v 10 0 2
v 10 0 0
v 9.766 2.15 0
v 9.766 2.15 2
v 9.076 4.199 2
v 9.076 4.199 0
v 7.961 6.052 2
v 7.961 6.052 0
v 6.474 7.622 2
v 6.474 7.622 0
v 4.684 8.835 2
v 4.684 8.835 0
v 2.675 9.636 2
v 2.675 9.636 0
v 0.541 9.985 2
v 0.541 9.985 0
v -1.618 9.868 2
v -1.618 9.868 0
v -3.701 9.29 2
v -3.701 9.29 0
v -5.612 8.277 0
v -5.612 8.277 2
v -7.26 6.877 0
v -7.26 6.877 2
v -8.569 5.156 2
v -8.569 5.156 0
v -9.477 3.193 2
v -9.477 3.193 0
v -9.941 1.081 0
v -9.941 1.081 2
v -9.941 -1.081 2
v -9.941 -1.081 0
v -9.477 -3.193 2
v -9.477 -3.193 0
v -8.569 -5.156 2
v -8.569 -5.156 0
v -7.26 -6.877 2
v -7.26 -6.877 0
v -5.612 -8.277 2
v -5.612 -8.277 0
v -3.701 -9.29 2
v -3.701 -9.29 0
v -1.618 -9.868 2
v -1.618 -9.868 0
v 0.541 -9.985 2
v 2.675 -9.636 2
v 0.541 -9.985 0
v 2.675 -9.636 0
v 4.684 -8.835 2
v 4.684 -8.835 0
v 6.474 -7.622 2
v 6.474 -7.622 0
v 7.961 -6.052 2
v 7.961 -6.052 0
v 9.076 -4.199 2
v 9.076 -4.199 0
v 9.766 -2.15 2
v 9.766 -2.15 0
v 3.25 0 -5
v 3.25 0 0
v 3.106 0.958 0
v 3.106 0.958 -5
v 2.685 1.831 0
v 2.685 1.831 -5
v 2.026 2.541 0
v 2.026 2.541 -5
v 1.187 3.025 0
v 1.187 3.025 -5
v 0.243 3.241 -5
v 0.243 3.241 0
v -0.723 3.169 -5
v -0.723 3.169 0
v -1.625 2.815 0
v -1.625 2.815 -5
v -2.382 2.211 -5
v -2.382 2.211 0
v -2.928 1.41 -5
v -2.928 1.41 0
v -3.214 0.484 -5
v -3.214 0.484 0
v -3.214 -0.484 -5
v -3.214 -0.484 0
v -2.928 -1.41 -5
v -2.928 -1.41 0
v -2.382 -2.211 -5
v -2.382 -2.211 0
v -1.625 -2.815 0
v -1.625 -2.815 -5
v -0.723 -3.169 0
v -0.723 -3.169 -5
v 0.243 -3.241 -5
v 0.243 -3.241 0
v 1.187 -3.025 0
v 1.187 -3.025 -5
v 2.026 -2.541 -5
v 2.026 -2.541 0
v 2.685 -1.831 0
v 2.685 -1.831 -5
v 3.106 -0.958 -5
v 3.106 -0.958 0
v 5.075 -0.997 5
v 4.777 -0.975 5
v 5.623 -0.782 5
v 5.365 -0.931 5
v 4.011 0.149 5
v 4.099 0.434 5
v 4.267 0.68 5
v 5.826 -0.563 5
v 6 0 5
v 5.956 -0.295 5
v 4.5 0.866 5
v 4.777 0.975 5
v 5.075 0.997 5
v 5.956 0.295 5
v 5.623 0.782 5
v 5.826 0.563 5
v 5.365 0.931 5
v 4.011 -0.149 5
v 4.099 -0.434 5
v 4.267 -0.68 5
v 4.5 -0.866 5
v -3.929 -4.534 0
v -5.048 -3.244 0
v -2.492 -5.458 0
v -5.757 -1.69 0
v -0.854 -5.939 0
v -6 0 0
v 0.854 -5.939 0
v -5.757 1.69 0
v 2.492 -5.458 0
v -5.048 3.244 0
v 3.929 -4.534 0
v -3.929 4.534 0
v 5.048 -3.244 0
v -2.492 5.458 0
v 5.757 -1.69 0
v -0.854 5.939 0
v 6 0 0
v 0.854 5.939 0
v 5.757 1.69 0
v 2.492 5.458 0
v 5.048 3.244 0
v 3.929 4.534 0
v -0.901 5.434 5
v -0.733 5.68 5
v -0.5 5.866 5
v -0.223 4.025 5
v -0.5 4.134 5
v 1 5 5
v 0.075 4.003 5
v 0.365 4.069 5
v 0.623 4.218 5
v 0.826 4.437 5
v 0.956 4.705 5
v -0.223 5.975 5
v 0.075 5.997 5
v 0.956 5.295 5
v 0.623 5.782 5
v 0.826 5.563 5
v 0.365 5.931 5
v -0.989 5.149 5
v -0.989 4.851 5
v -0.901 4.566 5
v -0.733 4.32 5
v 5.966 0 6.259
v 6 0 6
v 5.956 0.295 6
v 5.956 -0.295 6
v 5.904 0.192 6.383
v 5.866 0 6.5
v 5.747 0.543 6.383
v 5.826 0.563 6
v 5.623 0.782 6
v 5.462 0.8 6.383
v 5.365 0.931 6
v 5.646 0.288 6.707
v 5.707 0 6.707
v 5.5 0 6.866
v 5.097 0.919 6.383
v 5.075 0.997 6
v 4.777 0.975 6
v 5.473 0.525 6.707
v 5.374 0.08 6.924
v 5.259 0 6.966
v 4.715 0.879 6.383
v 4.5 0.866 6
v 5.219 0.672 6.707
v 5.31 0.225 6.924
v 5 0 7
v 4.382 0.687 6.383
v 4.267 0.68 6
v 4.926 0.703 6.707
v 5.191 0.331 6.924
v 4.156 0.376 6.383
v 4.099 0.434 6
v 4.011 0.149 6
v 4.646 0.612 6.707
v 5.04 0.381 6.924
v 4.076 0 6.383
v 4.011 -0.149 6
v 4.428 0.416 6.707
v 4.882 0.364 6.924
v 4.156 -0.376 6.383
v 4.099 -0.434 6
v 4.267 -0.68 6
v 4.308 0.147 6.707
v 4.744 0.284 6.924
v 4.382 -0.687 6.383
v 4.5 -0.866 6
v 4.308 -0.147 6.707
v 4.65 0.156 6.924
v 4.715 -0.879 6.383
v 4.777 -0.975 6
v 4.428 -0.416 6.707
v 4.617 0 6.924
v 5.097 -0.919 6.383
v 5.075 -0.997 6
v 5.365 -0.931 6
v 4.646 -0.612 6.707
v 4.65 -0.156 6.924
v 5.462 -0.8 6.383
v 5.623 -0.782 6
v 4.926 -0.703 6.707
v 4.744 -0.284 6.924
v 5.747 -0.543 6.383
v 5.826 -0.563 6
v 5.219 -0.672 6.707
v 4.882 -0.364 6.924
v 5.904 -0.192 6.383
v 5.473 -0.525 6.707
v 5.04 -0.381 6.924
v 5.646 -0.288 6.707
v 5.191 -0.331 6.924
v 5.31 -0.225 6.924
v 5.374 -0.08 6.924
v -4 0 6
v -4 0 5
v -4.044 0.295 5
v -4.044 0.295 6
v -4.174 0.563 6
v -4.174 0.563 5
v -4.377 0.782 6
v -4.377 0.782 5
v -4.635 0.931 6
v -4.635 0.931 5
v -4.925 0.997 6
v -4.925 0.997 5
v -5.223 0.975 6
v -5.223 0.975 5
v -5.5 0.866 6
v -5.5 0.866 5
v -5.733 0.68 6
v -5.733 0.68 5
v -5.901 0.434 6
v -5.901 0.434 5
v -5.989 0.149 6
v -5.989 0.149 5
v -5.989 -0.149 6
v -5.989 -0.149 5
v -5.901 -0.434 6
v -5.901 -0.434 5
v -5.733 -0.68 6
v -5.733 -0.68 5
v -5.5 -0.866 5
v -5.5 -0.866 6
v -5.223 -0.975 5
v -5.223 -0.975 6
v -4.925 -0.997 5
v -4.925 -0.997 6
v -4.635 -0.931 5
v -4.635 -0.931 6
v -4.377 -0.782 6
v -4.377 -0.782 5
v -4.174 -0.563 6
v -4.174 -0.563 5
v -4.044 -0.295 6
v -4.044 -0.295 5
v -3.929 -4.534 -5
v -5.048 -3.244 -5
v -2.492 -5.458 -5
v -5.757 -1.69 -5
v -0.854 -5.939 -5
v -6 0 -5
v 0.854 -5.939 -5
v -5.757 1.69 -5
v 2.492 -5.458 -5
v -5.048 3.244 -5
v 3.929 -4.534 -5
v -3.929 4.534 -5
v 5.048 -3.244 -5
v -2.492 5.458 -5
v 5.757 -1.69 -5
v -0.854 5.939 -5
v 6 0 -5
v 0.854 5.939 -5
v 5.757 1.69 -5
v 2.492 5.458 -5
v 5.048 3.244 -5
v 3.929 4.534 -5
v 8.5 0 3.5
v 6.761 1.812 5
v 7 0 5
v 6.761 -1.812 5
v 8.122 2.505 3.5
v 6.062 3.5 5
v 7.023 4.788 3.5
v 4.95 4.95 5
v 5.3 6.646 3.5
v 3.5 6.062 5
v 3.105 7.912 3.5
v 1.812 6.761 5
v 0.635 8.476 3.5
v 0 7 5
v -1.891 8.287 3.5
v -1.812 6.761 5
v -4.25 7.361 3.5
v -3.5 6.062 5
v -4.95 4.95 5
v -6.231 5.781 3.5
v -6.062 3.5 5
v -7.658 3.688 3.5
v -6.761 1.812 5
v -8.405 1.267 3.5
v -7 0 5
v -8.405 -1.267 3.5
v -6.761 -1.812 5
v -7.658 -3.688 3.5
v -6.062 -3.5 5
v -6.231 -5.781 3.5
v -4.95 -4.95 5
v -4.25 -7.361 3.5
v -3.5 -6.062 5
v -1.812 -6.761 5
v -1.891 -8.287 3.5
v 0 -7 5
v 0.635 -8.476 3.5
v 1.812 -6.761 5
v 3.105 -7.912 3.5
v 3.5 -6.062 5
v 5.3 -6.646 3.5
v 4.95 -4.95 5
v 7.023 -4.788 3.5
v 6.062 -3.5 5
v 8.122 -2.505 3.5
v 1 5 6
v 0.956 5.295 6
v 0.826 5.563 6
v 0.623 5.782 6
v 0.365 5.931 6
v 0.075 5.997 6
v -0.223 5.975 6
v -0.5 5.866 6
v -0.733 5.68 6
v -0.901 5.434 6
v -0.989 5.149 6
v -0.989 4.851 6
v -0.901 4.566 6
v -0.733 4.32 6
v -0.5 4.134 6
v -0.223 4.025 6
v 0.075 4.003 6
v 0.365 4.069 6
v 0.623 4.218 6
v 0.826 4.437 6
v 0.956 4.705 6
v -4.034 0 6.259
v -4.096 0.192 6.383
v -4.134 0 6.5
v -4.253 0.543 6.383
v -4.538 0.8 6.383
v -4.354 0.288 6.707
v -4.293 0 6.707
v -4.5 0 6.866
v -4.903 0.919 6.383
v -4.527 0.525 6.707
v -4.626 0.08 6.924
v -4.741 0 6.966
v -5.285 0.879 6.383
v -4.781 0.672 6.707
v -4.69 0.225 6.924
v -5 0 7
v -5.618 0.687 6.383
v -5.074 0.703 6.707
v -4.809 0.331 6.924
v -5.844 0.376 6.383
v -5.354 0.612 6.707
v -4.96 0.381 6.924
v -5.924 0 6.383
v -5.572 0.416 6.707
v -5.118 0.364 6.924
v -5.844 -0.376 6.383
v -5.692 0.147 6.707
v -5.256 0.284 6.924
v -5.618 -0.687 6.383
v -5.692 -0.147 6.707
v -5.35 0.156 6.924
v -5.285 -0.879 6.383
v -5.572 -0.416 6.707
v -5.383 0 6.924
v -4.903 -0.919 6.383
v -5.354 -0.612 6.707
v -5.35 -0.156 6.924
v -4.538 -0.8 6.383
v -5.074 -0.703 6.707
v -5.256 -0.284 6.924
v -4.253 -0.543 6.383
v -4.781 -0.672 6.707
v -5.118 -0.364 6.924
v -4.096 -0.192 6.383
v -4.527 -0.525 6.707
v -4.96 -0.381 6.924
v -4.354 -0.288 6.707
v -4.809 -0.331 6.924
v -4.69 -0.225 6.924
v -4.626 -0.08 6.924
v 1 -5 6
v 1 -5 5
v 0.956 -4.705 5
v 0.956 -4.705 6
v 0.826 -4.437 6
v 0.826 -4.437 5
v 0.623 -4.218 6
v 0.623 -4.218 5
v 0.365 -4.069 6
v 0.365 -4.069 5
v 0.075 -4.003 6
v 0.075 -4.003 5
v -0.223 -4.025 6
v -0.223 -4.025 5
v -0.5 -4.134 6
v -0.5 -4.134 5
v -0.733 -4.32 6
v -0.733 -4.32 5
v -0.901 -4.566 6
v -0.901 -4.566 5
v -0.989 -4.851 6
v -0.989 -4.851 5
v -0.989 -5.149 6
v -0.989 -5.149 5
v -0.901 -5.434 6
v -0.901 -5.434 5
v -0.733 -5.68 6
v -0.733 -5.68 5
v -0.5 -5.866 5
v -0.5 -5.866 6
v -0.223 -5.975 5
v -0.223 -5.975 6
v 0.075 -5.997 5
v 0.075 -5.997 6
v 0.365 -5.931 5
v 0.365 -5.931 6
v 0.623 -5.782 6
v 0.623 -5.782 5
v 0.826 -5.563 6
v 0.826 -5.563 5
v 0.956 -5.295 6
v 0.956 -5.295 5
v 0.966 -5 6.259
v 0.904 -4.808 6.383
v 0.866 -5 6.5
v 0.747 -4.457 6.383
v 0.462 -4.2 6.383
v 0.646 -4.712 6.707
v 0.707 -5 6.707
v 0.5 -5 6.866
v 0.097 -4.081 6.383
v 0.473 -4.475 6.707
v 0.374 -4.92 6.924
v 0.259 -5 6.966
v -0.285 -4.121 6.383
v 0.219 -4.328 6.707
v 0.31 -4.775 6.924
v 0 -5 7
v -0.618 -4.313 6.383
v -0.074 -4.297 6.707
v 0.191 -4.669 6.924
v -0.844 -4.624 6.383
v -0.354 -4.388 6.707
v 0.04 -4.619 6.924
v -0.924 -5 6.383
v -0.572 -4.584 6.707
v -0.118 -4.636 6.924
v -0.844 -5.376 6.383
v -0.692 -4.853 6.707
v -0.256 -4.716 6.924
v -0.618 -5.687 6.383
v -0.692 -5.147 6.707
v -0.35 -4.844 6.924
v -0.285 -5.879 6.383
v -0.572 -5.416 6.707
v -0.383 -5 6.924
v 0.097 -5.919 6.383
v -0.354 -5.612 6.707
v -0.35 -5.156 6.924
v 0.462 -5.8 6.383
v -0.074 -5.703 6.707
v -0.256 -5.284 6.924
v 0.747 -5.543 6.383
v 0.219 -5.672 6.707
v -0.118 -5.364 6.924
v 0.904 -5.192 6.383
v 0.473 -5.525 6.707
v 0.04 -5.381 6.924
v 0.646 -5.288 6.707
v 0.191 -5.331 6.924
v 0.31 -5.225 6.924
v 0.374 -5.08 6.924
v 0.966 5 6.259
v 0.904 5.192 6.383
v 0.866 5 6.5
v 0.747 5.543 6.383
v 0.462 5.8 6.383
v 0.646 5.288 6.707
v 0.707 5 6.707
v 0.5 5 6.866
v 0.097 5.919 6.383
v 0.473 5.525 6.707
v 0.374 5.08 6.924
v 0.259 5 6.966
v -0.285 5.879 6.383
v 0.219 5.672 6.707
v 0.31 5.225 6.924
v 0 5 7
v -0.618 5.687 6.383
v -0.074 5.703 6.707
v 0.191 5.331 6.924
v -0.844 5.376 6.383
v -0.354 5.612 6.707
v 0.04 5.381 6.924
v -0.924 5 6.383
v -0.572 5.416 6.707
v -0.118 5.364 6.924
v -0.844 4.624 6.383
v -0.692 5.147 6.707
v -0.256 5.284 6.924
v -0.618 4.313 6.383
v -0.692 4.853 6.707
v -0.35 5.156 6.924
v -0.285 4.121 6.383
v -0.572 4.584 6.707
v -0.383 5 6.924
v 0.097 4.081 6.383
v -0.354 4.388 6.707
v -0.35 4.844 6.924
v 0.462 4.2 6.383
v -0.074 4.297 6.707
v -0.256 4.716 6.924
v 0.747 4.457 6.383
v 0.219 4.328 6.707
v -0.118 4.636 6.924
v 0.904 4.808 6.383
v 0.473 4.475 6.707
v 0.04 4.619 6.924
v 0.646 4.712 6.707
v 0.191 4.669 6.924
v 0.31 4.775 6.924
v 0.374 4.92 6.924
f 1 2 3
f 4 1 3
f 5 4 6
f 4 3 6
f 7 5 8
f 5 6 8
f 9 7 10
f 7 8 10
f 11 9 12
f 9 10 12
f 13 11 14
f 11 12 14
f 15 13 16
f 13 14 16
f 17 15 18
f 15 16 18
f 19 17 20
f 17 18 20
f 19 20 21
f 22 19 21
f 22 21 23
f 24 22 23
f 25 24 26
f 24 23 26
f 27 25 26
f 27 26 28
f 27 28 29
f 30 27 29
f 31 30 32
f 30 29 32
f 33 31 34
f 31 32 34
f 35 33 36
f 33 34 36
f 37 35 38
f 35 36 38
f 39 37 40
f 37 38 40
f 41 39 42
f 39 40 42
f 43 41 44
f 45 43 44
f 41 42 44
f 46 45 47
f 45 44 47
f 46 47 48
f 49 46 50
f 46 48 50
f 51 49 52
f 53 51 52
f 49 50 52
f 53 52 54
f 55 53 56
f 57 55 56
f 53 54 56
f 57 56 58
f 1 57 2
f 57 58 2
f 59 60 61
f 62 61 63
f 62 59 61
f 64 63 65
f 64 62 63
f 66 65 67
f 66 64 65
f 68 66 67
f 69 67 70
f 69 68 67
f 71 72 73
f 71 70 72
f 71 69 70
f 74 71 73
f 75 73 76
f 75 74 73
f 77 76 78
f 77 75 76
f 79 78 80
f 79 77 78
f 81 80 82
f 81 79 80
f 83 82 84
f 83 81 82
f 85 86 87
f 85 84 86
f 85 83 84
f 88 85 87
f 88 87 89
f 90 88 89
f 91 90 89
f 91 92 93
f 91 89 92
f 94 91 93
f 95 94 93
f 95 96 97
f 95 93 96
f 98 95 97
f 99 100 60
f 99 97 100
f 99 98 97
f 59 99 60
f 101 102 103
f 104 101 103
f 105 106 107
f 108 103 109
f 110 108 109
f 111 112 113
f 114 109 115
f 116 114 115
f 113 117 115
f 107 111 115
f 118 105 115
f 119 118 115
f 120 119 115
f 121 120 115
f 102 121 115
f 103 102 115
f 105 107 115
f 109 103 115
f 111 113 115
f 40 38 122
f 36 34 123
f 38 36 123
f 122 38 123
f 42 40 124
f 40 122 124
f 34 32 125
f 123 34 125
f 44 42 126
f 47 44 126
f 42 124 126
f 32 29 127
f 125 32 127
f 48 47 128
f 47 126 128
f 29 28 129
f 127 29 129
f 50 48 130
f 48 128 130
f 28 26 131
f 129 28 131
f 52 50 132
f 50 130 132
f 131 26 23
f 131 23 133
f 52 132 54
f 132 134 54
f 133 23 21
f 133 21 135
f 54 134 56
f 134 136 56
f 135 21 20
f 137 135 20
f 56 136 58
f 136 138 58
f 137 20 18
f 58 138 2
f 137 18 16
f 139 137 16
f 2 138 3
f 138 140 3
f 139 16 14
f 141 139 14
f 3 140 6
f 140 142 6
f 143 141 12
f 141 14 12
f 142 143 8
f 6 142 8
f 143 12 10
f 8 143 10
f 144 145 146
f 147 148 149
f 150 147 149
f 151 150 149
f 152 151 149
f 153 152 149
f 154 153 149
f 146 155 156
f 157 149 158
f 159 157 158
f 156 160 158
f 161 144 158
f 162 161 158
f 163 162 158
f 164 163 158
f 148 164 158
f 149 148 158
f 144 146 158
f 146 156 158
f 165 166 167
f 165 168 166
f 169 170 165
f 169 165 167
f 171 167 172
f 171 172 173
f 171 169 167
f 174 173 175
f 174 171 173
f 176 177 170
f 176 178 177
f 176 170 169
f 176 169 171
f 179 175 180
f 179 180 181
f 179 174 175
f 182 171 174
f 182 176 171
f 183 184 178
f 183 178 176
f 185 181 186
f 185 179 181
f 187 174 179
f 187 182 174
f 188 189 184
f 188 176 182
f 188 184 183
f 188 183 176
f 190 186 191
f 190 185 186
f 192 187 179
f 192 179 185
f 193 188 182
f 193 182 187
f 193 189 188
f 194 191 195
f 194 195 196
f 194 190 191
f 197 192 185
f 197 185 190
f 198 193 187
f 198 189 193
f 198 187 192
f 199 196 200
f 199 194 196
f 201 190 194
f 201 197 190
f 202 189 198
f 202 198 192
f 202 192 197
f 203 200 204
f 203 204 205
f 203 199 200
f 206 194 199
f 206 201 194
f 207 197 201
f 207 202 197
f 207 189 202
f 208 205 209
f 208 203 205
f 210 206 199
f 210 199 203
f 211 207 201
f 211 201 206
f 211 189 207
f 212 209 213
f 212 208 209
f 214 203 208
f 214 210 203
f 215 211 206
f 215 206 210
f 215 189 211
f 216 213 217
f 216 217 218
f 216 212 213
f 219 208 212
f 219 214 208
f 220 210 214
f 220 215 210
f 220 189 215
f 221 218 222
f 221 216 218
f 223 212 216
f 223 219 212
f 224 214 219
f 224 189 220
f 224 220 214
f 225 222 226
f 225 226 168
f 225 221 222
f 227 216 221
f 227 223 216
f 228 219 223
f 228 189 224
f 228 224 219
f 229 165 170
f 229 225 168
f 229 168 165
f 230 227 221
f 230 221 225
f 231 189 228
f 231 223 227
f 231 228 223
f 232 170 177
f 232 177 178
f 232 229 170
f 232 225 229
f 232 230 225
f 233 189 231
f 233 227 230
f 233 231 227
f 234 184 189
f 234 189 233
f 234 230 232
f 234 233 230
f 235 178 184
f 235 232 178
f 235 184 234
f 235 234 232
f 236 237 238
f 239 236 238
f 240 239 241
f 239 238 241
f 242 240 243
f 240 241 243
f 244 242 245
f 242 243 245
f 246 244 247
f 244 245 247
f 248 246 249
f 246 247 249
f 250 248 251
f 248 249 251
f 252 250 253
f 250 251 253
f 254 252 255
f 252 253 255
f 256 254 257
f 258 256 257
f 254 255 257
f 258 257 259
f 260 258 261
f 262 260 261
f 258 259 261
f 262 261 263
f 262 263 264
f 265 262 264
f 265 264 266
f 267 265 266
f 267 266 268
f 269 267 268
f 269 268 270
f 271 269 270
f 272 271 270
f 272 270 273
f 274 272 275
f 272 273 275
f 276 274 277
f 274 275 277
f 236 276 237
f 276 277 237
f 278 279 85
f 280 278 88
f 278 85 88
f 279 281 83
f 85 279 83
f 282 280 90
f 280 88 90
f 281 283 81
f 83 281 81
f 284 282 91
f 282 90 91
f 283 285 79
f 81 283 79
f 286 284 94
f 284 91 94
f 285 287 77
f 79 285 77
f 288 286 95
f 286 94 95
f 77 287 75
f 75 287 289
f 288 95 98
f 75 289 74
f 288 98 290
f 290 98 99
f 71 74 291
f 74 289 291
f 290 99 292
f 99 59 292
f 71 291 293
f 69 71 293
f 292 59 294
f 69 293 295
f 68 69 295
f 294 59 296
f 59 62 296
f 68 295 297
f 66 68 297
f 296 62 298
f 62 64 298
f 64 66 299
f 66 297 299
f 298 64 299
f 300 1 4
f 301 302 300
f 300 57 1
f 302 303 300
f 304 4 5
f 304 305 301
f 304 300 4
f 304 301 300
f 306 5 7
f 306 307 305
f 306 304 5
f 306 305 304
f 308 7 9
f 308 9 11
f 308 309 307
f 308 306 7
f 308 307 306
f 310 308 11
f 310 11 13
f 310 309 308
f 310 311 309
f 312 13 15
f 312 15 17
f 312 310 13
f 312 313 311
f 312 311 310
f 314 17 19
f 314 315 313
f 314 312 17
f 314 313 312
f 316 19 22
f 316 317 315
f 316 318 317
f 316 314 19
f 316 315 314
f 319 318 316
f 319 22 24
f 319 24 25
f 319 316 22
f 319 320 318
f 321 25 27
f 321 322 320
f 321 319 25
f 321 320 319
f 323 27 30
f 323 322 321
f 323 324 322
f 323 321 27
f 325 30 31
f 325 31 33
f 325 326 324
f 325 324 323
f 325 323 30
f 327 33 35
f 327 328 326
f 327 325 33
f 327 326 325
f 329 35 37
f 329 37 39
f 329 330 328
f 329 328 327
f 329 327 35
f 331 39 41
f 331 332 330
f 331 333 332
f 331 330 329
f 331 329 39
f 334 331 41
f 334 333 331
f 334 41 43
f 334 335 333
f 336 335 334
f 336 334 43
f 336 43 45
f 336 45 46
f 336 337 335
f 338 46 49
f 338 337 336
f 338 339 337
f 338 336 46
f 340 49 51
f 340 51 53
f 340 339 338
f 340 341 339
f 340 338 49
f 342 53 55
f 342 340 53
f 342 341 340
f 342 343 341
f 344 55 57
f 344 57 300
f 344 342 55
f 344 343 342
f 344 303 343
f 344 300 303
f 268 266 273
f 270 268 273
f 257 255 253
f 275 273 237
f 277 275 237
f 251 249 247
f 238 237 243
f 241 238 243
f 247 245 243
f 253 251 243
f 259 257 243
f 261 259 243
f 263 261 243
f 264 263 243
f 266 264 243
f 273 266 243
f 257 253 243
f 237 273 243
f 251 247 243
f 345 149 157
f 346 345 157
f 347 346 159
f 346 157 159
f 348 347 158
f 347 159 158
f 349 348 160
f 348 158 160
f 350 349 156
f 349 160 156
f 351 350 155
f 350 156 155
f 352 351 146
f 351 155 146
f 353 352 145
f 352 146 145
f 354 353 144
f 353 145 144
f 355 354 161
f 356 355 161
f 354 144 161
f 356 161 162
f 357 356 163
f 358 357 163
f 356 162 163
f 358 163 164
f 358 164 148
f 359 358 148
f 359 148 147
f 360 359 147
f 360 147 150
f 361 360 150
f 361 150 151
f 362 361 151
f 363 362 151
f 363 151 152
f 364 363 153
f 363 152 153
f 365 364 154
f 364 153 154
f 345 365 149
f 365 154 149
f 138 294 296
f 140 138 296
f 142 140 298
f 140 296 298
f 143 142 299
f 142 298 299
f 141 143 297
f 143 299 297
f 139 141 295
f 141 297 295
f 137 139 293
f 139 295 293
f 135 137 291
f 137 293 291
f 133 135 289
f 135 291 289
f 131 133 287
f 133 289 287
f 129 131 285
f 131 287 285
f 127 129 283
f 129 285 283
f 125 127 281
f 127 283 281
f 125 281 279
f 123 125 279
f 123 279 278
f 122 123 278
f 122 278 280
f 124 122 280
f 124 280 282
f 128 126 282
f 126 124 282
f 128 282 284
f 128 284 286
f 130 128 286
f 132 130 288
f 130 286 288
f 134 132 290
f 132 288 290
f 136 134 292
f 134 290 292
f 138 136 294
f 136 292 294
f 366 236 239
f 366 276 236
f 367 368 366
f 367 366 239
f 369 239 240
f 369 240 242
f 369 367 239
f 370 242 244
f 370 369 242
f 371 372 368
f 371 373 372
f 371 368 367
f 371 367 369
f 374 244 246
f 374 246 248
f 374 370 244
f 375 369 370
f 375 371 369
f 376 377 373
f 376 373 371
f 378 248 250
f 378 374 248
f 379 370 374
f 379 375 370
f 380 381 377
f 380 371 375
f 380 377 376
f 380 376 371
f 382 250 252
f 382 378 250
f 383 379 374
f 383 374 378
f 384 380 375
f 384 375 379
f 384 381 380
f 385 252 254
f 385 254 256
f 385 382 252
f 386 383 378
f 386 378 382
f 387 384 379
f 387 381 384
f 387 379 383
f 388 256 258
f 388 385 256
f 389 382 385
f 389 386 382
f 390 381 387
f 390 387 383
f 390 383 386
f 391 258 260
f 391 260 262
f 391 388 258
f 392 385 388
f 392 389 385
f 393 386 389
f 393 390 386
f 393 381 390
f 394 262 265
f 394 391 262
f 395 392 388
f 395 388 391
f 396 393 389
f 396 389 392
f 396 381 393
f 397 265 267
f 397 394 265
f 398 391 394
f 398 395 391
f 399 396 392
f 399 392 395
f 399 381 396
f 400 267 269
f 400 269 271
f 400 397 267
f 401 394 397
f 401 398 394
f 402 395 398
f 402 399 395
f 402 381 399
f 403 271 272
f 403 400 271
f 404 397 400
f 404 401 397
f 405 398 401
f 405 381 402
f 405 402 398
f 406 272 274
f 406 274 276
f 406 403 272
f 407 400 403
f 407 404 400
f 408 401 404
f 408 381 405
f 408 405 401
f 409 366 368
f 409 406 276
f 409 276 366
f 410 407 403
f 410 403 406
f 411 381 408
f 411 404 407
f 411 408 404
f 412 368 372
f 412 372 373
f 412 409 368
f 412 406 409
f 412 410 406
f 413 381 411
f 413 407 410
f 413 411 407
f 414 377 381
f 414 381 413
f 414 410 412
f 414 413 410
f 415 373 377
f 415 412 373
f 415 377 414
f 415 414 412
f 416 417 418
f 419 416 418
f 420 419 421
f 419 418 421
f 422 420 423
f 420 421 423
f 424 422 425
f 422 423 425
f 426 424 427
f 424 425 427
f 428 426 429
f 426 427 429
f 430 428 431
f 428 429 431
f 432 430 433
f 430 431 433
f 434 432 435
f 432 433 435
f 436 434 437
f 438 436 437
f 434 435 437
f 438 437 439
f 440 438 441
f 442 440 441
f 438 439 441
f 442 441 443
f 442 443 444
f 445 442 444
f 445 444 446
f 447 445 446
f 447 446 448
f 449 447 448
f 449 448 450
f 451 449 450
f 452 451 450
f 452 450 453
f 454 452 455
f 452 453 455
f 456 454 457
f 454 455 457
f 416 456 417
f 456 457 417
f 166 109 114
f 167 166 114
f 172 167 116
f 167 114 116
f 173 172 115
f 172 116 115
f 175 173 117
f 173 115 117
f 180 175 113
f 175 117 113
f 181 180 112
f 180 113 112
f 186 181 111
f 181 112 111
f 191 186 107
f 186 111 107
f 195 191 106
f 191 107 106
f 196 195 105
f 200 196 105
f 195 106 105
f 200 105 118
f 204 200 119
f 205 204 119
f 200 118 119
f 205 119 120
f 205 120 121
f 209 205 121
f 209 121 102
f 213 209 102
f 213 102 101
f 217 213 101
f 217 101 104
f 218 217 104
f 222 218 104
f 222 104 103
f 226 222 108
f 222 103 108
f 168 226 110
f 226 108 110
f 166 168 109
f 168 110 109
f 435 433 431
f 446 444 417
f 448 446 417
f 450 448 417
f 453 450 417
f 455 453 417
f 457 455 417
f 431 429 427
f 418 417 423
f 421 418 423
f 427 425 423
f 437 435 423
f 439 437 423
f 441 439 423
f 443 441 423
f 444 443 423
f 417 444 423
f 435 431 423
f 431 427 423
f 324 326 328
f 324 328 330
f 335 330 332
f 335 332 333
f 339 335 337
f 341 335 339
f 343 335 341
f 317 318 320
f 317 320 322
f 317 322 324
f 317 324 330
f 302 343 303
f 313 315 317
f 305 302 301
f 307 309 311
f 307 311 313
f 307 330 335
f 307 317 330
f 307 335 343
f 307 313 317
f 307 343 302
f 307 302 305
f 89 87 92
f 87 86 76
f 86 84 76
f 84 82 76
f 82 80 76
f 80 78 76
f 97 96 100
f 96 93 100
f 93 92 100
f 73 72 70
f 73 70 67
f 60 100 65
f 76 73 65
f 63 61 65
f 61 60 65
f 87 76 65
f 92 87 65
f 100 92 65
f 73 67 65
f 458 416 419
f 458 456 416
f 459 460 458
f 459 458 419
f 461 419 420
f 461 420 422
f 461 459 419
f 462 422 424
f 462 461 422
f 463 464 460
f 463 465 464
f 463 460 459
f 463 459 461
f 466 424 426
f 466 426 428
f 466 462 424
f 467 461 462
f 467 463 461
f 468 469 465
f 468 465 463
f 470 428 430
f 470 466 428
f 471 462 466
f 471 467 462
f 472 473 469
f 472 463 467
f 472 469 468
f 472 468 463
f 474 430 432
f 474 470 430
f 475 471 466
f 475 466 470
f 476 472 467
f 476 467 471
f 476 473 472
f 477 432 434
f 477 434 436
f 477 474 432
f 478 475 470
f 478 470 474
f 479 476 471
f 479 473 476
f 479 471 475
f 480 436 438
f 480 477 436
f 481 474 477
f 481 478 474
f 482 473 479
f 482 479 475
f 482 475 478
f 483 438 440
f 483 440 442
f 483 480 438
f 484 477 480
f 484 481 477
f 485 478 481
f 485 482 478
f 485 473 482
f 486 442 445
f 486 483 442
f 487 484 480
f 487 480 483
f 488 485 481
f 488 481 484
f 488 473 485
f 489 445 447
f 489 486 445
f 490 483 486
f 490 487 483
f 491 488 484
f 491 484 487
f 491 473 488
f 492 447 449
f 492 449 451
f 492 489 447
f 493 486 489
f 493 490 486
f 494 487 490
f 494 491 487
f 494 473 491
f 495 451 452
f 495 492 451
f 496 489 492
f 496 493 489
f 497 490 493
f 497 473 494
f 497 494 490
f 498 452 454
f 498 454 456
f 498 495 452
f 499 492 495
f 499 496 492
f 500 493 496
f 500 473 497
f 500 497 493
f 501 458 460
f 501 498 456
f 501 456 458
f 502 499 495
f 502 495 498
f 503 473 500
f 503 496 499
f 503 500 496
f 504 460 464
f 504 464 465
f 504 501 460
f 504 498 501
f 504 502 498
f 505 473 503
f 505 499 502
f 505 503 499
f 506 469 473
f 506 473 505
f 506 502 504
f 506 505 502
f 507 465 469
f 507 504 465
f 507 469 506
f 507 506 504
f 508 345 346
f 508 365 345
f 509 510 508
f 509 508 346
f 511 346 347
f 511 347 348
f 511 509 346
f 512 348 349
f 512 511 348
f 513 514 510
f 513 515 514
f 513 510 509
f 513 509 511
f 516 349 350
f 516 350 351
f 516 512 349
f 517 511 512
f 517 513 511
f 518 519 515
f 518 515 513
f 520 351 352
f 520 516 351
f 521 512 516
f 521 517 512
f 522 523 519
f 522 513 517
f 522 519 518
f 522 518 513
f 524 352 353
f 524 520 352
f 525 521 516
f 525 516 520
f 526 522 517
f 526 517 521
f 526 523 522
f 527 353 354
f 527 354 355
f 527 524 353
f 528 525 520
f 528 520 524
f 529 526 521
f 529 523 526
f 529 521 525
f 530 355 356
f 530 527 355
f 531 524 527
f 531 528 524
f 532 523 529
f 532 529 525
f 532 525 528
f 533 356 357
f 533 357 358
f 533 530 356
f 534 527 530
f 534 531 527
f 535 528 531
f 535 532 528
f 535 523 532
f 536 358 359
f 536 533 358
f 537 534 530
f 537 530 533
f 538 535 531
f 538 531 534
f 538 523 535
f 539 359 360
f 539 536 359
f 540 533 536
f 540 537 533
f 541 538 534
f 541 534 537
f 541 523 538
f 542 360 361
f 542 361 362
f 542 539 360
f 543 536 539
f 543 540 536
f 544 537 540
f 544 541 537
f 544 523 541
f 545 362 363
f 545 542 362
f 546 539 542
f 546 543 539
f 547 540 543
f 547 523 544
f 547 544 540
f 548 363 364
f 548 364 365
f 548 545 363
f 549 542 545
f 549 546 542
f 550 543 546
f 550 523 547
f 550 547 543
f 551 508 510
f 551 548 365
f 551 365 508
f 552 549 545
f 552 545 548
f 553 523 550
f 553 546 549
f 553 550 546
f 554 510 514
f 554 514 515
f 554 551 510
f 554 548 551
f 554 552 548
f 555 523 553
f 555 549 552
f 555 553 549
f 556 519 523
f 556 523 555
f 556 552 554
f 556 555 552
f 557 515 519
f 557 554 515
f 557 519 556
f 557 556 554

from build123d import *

# Parameters (mm, degrees)
BOSS_EXTRUDE1_DEPTH      = 5
BOSS_EXTRUDE1_DEPTH_BACK = 5
SKETCH1_R                = 6
SKETCH1_R_2              = 3.25
SKETCH2_R                = 10.000000149
BOSS_EXTRUDE2_DEPTH      = 5
CHAMFER1_SIZE            = 3
SKETCH3_R                = 1
BOSS_EXTRUDE3_DEPTH      = 2
BOSS_EXTRUDE3_2_DEPTH    = 2
BOSS_EXTRUDE3_3_DEPTH    = 2
BOSS_EXTRUDE3_4_DEPTH    = 2
FILLET1_R                = 1
FILLET2_R                = 1
FILLET3_R                = 1
FILLET4_R                = 1


with BuildPart() as part:
    # Sketch1 → Boss-Extrude1 (new, two sides: drawn at the far end of the back side and taken through both)
    with BuildSketch(Plane.XY.offset(-BOSS_EXTRUDE1_DEPTH_BACK)):
        Circle(SKETCH1_R)
        Circle(SKETCH1_R_2, mode=Mode.SUBTRACT)
    extrude(amount=BOSS_EXTRUDE1_DEPTH + BOSS_EXTRUDE1_DEPTH_BACK)

    # Sketch2 → Boss-Extrude2 (add)
    with BuildSketch(Plane.XY):
        Circle(SKETCH2_R)
    extrude(amount=BOSS_EXTRUDE2_DEPTH)

    # Chamfer1
    chamfer1_edges = [part.edges().sort_by_distance(p)[0] for p in [
        (-10.000000149, 0, 5),
    ]]
    chamfer(chamfer1_edges, length=CHAMFER1_SIZE)


with BuildPart() as body_2:
    # Sketch3 → Boss-Extrude3 (new body)
    with BuildSketch(Plane.XY.offset(5)):
        with Locations((0, 5)):
            Circle(SKETCH3_R)
    extrude(amount=BOSS_EXTRUDE3_DEPTH)

    # Fillet4
    fillet4_edges = [body_2.edges().sort_by_distance(p)[0] for p in [
        (-1, 5, 7),
    ]]
    fillet(fillet4_edges, radius=FILLET4_R)


with BuildPart() as body_3:
    # Sketch3 → Boss-Extrude3 2 (new body)
    with BuildSketch(Plane.XY.offset(5)):
        with Locations((5, 0)):
            Circle(SKETCH3_R)
    extrude(amount=BOSS_EXTRUDE3_2_DEPTH)

    # Fillet3
    fillet3_edges = [body_3.edges().sort_by_distance(p)[0] for p in [
        (4, 0, 7),
    ]]
    fillet(fillet3_edges, radius=FILLET3_R)


with BuildPart() as body_4:
    # Sketch3 → Boss-Extrude3 3 (new body)
    with BuildSketch(Plane.XY.offset(5)):
        with Locations((0, -5)):
            Circle(SKETCH3_R)
    extrude(amount=BOSS_EXTRUDE3_3_DEPTH)

    # Fillet2
    fillet2_edges = [body_4.edges().sort_by_distance(p)[0] for p in [
        (-1, -5, 7),
    ]]
    fillet(fillet2_edges, radius=FILLET2_R)


with BuildPart() as body_5:
    # Sketch3 → Boss-Extrude3 4 (new body)
    with BuildSketch(Plane.XY.offset(5)):
        with Locations((-5, 0)):
            Circle(SKETCH3_R)
    extrude(amount=BOSS_EXTRUDE3_4_DEPTH)

    # Fillet1
    fillet1_edges = [body_5.edges().sort_by_distance(p)[0] for p in [
        (-6, 0, 7),
    ]]
    fillet(fillet1_edges, radius=FILLET1_R)


solid = Compound([part.part, body_2.part, body_3.part, body_4.part, body_5.part])
